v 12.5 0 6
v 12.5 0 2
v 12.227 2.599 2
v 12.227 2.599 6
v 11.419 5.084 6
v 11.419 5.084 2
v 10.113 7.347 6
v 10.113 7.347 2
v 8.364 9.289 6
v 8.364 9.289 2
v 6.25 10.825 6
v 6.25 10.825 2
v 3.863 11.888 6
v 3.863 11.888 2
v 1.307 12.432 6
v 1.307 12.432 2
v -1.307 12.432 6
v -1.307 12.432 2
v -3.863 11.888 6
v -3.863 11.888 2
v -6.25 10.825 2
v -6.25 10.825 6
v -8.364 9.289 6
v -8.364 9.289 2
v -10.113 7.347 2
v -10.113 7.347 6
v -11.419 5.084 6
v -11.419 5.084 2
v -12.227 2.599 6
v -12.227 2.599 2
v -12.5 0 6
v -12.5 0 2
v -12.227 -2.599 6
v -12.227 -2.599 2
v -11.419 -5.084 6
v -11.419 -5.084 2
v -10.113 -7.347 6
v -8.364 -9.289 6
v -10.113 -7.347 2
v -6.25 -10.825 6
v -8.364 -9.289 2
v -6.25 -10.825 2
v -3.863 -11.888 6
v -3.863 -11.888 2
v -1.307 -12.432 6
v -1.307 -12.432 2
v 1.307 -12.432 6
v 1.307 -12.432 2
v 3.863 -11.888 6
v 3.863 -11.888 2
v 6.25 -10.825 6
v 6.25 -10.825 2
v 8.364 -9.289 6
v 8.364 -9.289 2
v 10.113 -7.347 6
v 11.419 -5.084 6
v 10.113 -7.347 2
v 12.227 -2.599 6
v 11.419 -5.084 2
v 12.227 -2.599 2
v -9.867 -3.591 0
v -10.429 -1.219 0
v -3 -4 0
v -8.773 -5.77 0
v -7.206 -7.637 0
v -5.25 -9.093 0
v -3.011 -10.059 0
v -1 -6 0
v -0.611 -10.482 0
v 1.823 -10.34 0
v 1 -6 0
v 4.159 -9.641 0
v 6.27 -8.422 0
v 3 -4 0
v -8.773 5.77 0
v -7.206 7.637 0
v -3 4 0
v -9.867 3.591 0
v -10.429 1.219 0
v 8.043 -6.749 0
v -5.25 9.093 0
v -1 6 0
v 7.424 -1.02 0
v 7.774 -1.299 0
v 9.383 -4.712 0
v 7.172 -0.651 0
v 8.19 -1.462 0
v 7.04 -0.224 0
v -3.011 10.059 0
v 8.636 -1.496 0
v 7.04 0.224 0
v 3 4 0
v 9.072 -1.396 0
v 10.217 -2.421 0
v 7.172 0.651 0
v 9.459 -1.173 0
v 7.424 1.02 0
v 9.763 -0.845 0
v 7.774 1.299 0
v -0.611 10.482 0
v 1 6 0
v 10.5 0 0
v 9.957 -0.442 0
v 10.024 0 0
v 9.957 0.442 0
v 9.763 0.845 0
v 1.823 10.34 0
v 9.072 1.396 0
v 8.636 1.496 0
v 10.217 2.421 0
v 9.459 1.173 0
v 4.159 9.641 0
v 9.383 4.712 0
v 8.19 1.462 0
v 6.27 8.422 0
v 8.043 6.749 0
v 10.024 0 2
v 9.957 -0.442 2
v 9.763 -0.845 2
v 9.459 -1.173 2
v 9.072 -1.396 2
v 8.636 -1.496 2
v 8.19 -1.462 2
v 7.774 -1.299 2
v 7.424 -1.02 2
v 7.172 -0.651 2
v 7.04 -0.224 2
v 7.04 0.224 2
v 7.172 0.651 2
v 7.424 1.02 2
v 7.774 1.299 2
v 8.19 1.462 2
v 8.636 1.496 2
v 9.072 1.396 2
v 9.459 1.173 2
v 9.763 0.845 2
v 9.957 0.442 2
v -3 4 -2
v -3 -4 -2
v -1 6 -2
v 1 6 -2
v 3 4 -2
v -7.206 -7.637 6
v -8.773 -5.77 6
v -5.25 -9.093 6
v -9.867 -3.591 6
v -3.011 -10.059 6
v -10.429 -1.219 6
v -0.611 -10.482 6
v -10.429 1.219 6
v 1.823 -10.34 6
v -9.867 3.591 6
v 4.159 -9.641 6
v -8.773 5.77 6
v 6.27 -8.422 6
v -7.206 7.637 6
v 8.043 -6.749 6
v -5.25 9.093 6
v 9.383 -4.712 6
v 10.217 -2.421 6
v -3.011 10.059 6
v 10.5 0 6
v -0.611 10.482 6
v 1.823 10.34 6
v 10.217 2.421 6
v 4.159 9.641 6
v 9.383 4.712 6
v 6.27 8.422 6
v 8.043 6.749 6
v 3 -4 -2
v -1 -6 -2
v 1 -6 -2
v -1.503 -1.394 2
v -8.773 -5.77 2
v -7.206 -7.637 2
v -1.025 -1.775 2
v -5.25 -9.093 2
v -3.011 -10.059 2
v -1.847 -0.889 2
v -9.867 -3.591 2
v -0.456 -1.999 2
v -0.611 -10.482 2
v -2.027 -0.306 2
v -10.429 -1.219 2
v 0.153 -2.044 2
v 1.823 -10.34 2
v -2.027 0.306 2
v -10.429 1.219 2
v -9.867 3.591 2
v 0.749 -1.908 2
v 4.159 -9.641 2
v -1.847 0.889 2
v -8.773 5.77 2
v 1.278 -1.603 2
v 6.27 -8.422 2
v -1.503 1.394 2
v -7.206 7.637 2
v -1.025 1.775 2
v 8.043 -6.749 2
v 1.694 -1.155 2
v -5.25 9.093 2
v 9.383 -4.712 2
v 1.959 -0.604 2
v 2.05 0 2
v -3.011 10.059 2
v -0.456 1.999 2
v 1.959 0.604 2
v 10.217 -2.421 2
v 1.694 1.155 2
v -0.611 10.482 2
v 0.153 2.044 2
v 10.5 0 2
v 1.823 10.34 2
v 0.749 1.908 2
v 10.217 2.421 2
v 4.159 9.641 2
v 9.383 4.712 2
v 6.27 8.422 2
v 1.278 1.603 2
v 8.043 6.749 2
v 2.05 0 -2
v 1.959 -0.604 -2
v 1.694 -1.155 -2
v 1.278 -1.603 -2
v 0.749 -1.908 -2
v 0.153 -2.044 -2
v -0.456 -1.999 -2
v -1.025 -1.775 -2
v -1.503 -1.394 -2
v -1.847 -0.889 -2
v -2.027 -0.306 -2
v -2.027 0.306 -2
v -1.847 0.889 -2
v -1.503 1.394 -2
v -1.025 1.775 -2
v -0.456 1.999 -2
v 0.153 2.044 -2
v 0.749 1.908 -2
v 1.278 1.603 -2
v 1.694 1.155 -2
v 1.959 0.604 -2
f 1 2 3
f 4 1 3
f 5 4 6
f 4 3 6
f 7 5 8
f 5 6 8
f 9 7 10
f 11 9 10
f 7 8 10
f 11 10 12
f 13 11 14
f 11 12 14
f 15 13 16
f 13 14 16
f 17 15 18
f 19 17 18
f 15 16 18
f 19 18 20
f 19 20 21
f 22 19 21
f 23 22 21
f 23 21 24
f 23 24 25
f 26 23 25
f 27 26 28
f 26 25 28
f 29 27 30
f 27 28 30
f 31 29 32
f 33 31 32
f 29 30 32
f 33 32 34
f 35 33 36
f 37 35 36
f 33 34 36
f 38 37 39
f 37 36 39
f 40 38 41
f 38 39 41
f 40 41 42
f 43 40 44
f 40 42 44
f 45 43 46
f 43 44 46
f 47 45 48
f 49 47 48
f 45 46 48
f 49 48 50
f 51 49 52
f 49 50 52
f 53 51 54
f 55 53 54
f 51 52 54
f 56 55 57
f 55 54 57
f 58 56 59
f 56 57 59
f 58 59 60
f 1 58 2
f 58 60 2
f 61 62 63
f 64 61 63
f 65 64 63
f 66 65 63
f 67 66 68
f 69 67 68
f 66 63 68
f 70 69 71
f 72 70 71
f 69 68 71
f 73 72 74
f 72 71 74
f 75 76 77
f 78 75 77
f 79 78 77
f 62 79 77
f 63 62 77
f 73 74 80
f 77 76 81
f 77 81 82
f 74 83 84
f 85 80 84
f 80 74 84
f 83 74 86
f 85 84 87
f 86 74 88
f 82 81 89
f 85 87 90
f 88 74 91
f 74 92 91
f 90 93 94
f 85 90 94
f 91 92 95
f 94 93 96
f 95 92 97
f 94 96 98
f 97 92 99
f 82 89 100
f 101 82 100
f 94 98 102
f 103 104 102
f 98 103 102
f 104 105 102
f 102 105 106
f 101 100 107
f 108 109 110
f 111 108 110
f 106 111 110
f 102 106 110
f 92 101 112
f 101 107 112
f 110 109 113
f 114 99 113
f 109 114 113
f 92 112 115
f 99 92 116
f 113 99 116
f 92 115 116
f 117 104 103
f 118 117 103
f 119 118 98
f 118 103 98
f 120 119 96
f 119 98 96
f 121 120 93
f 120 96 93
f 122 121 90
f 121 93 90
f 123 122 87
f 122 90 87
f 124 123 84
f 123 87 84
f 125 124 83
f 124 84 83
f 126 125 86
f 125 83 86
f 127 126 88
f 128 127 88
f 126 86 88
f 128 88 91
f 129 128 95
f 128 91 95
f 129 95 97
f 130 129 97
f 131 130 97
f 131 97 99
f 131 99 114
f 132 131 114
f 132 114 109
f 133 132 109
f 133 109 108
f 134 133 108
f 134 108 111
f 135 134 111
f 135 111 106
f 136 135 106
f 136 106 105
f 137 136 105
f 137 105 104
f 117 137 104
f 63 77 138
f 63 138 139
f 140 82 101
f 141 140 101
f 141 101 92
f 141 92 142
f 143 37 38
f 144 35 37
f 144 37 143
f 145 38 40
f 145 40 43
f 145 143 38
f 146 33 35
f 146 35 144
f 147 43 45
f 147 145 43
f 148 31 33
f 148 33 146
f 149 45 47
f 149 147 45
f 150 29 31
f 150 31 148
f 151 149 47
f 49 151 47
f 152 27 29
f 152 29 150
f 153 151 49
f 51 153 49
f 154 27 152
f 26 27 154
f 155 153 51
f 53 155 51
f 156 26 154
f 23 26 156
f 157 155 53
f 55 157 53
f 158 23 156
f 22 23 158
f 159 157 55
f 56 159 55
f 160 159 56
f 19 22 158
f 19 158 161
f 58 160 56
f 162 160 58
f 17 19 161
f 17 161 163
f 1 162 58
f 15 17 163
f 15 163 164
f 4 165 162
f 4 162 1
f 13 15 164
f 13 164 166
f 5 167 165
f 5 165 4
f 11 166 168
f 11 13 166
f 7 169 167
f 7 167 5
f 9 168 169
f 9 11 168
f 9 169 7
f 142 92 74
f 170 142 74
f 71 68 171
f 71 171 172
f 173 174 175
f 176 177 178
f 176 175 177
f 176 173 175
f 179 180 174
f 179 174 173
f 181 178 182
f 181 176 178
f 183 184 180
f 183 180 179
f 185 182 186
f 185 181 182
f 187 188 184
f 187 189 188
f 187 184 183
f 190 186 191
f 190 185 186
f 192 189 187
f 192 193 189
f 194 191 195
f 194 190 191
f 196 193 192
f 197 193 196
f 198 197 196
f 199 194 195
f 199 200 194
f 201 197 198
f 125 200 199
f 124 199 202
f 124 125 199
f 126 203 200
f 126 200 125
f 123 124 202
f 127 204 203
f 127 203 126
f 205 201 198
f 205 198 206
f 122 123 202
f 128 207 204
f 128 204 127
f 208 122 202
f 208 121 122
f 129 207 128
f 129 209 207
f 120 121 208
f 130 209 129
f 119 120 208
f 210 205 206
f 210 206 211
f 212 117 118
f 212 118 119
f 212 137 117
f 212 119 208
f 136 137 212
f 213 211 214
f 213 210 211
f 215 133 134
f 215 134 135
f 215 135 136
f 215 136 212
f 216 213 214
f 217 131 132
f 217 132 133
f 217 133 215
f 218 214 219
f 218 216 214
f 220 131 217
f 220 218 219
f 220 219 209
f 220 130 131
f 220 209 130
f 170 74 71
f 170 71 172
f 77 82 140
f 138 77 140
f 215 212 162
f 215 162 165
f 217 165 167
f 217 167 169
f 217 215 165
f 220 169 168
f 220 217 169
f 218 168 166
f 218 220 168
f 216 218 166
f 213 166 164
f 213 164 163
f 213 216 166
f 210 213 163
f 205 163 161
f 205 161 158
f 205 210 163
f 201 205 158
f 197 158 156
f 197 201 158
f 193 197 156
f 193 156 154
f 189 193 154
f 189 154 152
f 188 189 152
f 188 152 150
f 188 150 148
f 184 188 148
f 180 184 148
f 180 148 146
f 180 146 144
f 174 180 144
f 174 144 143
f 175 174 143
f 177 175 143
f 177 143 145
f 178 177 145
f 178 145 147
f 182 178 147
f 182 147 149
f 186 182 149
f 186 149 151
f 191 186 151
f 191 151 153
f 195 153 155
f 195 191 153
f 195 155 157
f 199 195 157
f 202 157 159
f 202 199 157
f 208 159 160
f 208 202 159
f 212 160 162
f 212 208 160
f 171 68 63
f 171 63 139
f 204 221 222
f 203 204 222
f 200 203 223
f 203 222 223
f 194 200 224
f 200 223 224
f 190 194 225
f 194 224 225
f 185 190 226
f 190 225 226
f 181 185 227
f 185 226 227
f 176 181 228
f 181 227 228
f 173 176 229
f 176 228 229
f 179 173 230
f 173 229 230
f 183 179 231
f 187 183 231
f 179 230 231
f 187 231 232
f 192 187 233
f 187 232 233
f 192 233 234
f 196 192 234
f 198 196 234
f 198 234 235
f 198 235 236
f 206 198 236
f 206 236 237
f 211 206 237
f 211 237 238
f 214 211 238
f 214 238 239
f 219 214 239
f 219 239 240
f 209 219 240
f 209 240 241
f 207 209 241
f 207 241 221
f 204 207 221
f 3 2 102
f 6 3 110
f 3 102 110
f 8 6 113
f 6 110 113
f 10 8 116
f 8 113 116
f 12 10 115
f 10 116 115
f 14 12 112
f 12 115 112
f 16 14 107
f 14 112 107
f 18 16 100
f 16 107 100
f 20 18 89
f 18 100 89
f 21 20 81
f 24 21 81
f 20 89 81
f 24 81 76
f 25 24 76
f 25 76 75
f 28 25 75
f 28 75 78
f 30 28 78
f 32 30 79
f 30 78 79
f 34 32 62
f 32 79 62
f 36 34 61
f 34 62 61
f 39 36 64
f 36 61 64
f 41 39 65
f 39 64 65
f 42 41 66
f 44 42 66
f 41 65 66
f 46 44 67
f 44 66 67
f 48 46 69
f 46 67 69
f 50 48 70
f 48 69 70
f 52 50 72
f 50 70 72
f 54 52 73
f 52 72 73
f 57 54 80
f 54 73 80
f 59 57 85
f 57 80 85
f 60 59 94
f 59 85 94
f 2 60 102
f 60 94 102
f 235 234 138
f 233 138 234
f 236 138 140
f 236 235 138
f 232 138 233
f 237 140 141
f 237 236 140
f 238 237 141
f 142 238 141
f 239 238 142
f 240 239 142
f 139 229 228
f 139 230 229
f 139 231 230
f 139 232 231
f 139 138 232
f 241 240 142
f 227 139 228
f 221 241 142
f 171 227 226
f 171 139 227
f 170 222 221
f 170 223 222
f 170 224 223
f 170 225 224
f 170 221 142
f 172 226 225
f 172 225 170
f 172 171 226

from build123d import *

# Parameters (mm, degrees)
F0_R      = 12.5
F1_DEPTH  = 6
F2_T      = -2
F3_SIZE   = 2
F4_W      = 6
F4_H      = 12
F5_DEPTH  = 2
F6_SIZE   = 2
F7_R      = 2.05
F8_DEPTH  = 25
F9_R      = 1.5
F10_DEPTH = 25


with BuildPart() as f1:
    # F0 (on Top) → F1 (new body)
    with BuildSketch(Plane.XY):
        Circle(F0_R)
    extrude(amount=F1_DEPTH)

    # F2
    f2_openings = [f1.faces().sort_by_distance(p)[0] for p in [
        (0, 0, 6),
    ]]
    offset(amount=F2_T, openings=f2_openings)

    # F3
    f3_edges = [f1.edges().sort_by_distance(p)[0] for p in [
        (-12.5, 0, 0),
    ]]
    chamfer(f3_edges, length=F3_SIZE)

    # F4 (on face) → F5 (join)
    with BuildSketch(Plane(origin=(0, 0, 0), x_dir=(1, 0, 0), z_dir=(0, 0, -1))):
        Rectangle(F4_W, F4_H)
    extrude(amount=F5_DEPTH)

    # F6
    f6_edges = [f1.edges().sort_by_distance(p)[0] for p in [
        (3, -6, -1),
        (-3, -6, -1),
        (3, 6, -1),
        (-3, 6, -1),
    ]]
    chamfer(f6_edges, length=F6_SIZE)

    # F7 (on face) → F8 (cut)
    with BuildSketch(Plane(origin=(0, 0, -2), x_dir=(1, 0, 0), z_dir=(0, 0, -1))):
        Circle(F7_R)
    extrude(amount=-F8_DEPTH, mode=Mode.SUBTRACT)

    # F9 (on face) → F10 (cut)
    with BuildSketch(Plane(origin=(0, 0, 0), x_dir=(1, 0, 0), z_dir=(0, 0, -1))):
        with Locations((8.523585, 0)):
            Circle(F9_R)
    extrude(amount=-F10_DEPTH, mode=Mode.SUBTRACT)


solid = f1.part
